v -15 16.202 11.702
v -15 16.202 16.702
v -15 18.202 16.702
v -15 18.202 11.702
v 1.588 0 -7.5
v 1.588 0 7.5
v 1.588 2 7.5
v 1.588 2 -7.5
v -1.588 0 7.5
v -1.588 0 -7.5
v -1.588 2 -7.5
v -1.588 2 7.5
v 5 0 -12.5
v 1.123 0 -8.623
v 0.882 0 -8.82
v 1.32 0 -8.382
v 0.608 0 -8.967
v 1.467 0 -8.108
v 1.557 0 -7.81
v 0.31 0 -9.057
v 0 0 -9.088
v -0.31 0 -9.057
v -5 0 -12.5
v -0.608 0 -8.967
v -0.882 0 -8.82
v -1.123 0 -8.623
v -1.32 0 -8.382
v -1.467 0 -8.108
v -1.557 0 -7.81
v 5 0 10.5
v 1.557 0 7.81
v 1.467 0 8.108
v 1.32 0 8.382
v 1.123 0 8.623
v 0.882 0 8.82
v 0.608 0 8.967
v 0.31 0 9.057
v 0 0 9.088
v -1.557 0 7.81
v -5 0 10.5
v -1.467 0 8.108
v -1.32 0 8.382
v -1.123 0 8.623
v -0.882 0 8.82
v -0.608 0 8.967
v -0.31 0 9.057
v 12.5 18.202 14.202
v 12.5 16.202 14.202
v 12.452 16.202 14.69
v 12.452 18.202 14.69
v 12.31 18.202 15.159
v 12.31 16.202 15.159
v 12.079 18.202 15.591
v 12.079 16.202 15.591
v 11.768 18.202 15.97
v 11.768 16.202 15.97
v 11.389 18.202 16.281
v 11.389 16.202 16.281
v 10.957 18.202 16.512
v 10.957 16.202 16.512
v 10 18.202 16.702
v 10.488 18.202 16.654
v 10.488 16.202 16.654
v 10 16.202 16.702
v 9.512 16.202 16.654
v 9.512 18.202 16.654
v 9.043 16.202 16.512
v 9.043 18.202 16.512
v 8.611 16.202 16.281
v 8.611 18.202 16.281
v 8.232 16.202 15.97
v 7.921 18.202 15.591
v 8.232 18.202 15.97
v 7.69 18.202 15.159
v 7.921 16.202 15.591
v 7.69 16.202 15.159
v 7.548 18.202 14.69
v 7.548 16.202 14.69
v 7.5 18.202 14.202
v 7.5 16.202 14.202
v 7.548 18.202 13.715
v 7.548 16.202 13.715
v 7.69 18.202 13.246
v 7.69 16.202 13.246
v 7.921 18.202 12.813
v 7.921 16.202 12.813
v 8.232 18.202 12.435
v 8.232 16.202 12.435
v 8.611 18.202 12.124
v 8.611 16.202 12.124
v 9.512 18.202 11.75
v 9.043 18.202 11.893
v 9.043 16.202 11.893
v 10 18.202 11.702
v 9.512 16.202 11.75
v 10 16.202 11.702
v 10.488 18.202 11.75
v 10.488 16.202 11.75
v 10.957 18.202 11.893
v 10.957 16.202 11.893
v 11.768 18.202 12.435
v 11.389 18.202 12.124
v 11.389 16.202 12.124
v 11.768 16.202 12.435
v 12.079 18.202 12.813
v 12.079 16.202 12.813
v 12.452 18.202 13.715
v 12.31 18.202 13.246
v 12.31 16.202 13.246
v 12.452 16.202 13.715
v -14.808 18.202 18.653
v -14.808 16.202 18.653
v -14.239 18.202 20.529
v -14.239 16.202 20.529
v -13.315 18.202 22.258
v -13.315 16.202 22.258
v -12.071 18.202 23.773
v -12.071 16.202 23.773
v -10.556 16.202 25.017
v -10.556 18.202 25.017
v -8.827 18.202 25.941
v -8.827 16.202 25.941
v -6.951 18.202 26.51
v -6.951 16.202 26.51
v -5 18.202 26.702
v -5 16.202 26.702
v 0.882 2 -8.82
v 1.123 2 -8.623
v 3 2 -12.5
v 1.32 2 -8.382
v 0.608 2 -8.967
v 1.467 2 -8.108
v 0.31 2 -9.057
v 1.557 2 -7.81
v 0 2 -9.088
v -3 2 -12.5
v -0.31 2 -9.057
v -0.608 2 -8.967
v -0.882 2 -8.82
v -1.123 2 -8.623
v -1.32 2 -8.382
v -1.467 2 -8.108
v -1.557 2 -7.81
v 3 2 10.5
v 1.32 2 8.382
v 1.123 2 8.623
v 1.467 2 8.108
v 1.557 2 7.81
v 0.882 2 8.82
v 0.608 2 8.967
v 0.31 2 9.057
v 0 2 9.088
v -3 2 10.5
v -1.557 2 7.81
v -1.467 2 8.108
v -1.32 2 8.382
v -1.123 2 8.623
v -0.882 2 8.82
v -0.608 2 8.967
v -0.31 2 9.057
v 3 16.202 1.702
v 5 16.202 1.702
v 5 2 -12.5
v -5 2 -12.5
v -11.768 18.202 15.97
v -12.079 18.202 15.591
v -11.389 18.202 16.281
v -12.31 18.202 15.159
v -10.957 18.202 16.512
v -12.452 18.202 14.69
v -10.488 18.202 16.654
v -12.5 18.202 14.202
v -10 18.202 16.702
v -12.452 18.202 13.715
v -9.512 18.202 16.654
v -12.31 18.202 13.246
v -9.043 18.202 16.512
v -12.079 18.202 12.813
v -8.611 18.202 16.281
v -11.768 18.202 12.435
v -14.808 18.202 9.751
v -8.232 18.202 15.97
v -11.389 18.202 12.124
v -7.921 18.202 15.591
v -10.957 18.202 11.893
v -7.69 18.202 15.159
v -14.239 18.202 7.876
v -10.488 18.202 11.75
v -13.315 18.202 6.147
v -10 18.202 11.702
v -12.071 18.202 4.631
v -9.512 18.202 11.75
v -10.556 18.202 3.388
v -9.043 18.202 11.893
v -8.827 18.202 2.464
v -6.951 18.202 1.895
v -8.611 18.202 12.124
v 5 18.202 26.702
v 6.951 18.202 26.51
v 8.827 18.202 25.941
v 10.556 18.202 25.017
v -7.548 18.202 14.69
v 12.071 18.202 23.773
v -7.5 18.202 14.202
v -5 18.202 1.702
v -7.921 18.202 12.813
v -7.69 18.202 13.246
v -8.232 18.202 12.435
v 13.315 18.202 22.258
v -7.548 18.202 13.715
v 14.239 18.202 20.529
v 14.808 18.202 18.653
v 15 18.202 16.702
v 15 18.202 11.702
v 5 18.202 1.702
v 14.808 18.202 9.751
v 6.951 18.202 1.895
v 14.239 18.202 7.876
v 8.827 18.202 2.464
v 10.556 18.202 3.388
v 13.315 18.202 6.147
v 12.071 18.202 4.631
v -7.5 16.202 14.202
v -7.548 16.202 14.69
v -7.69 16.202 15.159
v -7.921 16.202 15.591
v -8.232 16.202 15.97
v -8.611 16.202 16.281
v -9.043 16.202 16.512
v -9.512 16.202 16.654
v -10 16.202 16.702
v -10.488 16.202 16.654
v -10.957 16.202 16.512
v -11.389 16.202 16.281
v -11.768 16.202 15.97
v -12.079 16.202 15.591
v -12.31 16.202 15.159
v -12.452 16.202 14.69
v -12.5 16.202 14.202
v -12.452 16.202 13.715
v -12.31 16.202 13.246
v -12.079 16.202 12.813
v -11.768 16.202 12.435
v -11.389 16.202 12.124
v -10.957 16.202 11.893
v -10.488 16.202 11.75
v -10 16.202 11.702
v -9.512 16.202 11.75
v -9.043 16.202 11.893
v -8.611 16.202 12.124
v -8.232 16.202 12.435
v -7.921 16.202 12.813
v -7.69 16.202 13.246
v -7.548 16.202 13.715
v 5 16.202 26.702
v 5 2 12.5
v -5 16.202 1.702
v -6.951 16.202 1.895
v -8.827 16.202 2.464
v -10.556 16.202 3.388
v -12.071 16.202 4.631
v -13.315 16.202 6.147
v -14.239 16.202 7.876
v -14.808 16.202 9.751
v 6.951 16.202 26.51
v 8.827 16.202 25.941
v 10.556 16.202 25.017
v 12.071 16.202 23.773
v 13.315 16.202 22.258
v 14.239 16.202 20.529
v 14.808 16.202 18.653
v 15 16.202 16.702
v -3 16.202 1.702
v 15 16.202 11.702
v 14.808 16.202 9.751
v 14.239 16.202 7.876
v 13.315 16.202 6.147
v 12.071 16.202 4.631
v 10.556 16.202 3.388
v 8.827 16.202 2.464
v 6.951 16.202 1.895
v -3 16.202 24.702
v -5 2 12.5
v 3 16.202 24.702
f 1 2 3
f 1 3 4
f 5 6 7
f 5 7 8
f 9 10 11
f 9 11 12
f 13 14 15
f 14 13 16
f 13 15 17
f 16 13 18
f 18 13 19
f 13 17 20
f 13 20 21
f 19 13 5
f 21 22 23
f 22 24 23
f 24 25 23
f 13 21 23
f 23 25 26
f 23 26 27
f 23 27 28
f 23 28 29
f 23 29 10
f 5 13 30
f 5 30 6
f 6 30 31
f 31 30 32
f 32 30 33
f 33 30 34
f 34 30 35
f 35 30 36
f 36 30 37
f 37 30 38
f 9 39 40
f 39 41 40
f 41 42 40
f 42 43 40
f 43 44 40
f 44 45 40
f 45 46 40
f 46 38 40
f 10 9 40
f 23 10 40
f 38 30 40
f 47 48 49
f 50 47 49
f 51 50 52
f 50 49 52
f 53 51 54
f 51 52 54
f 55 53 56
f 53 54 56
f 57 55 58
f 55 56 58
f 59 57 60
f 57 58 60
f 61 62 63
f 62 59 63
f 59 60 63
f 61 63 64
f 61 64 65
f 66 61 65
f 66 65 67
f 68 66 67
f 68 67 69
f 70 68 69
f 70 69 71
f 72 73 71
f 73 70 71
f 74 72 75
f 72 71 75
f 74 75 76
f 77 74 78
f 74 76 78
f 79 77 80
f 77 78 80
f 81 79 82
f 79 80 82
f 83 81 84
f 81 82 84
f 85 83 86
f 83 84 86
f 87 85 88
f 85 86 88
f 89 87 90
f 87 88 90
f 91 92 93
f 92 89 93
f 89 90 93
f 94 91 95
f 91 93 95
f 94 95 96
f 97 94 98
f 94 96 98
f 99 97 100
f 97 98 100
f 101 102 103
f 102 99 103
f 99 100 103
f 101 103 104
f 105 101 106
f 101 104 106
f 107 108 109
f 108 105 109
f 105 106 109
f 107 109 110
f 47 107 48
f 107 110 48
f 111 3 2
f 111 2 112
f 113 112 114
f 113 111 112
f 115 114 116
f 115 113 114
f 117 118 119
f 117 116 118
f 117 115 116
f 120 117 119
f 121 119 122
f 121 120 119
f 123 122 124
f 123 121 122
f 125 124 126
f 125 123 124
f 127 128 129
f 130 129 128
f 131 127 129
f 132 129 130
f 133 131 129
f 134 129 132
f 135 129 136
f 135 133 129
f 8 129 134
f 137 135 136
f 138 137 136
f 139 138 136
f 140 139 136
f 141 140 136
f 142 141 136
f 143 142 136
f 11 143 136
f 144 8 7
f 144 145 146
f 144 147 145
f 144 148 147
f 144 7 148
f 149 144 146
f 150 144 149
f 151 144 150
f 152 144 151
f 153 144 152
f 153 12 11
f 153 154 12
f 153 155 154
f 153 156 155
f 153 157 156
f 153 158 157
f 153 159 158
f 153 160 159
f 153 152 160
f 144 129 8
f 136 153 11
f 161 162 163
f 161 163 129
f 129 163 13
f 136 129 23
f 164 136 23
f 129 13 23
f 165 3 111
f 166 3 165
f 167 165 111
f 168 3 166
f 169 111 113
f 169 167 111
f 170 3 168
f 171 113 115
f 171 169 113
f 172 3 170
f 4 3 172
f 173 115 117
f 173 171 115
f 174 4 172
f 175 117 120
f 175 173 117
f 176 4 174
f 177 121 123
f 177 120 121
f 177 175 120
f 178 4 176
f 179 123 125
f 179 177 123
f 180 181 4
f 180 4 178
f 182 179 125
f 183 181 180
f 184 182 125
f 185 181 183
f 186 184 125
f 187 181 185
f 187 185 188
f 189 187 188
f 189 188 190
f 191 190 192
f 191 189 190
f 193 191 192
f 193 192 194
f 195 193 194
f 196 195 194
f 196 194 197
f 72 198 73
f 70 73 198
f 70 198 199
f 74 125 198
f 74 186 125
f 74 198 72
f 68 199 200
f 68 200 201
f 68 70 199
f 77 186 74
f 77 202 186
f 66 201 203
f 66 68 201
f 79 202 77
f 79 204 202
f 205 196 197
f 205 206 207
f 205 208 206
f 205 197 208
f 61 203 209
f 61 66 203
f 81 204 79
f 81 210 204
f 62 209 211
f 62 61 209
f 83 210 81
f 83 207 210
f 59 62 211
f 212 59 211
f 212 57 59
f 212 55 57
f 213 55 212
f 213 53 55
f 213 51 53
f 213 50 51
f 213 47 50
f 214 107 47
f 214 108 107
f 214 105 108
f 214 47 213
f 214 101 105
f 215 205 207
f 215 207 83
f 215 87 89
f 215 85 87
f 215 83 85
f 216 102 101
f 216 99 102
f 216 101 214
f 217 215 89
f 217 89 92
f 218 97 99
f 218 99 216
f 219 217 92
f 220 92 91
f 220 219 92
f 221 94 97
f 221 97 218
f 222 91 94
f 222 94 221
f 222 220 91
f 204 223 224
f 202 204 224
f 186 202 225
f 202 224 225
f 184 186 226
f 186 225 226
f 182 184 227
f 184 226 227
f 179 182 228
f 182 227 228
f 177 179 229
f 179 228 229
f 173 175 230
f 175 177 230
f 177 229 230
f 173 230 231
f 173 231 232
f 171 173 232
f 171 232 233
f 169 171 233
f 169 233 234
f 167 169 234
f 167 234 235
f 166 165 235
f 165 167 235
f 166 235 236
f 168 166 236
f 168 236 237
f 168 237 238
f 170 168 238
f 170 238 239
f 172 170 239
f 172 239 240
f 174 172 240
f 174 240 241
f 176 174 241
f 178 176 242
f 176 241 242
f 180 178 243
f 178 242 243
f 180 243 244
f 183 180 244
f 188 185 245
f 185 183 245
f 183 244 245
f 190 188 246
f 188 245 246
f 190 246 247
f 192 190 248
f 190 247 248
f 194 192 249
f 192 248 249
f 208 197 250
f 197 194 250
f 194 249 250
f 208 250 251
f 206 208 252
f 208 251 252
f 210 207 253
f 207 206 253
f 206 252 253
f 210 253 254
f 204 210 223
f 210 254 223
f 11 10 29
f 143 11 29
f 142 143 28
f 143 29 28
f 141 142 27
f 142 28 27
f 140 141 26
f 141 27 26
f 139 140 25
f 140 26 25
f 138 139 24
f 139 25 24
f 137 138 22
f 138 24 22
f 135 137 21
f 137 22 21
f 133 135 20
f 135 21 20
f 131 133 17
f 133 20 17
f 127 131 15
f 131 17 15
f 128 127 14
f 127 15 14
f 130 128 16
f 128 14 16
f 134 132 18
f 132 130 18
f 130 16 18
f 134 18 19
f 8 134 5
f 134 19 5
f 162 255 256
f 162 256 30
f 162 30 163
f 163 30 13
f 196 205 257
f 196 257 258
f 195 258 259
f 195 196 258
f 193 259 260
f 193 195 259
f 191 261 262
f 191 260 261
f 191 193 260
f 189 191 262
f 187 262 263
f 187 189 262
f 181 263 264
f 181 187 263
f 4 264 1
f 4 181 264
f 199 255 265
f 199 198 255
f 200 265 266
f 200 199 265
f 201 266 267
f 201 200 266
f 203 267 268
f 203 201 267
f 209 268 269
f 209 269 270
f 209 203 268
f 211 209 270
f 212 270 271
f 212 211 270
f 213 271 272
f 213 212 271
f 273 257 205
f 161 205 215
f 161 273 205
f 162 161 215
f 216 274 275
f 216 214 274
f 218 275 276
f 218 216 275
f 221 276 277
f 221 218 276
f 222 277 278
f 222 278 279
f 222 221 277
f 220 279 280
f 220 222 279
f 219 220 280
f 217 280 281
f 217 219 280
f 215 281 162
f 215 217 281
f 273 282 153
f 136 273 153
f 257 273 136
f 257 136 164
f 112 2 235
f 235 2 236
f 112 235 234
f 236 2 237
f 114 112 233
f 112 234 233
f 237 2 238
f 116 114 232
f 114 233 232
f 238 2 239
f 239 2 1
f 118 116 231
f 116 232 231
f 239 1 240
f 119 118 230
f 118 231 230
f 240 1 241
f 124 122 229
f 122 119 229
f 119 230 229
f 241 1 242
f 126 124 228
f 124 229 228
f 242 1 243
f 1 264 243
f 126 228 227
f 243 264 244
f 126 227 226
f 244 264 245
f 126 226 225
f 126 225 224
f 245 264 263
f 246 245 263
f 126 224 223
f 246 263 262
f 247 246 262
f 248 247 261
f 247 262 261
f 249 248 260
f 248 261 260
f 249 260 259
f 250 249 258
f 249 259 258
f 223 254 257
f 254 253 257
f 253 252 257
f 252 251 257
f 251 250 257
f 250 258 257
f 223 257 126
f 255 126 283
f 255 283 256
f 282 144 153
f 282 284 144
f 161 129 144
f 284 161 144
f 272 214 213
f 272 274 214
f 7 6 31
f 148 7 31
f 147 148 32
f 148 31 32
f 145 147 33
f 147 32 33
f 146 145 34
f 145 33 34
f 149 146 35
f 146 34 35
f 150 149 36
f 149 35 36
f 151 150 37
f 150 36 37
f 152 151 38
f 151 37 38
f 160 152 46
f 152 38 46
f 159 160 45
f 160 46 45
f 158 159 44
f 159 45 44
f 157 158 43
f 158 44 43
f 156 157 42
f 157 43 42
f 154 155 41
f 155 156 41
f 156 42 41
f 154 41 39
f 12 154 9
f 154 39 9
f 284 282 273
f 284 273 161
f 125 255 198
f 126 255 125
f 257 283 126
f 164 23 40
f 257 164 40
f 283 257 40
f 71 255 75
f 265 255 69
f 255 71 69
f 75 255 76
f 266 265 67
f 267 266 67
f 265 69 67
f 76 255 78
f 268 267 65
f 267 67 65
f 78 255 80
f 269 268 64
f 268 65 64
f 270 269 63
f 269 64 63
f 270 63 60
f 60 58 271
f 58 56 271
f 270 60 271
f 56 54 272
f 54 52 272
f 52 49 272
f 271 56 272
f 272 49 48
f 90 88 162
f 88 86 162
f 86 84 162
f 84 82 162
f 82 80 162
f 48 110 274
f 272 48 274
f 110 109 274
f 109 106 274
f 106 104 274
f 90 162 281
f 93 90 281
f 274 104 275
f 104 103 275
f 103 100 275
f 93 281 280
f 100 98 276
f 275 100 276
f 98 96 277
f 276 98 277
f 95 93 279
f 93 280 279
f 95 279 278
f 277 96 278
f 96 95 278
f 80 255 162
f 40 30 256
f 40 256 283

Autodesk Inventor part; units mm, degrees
ref_plane "YZ Plane" through (0, 0, 0) normal (1, 0, 0) x (0, 1, 0)
ref_plane "XZ Plane" through (0, 0, 0) normal (0, 1, 0) x (-1, 0, 0)
ref_plane "XY Plane" through (0, 0, 0) normal (0, 0, 1) x (1, 0, 0)
sketch "Sketch1" plane through (0, 0, 0) normal (0, 1, 0) x (-1, 0, 0)
  line L0 (5, 12.5) -> (-5, 12.5)
  line L1 (-5, 12.5) -> (-5, -12.5)
  line L2 (-5, -12.5) -> (5, -12.5)
  line L3 (5, -12.5) -> (5, 12.5)
  line L4 (5, 12.5) -> (-5, -12.5) construction
  line L5 (-5, 12.5) -> (5, -12.5) construction
  line L6 (0, 7.5) -> (0, -7.5) construction
  line L7 (-1.5875, 7.5) -> (-1.5875, -7.5)
  line L8 (1.5875, -7.5) -> (1.5875, 7.5)
  arc A0 (1.5875, 7.5) -> (-1.5875, 7.5) centre (0, 7.5) ccw
  arc A1 (-1.5875, -7.5) -> (1.5875, -7.5) centre (0, -7.5) ccw
  point P0 (0, 0)
  point P1 (0, 0)
  dimension "d0" = 10
  dimension "d1" = 25
  dimension "d2" = 7.5
  dimension "d3" = 7.5
  dimension "d4" = 3.175
extrude "Extrusion1" add sketch "Sketch1" along normal blind 2
sketch "Sketch2" plane through (0, 2, 0) normal (0, 1, 0) x (1, 0, 0)
  line L0 (5, -12.5) -> (5, 12.5) projected
  line L1 (5, 12.5) -> (-5, 12.5) projected
  line L2 (-5, 12.5) -> (-5, -12.5) projected
  line L3 (-5, -12.5) -> (5, -12.5) projected
  arc A0 (-1.5875, -7.5) -> (1.5875, -7.5) centre (0, -7.5) ccw projected
  line L4 (-1.5875, -7.5) -> (-1.5875, 7.5) projected
  arc A1 (1.5875, 7.5) -> (-1.5875, 7.5) centre (0, 7.5) ccw projected
  line L5 (1.5875, 7.5) -> (1.5875, -7.5) projected
  line L6 (-3, -10.5) -> (-3, 10.5)
  line L7 (3, 10.5) -> (3, -10.5)
  line L8 (3, -10.5) -> (-3, -10.5)
  line L9 (-3, 10.5) -> (-3, 12.5)
  line L10 (3, 10.5) -> (3, 12.5)
  point P0 (0, 0)
  dimension "d7" = 2
sketch "Sketch3" plane through (0, 0, 0) normal (1, 0, 0) x (0, 1, 0)
  line L0 (2, 12.5) -> (16.2024, 26.7024)
  point P0 (0, 0)
  dimension "d15" = 20.0852
sweep "Sweep1" add profiles "Sketch2" path "Sketch3" contours L3 L2 L1 L9 L6 L8 L7 L10 L0
chamfer "Chamfer1" distance 2 angle 45 1 edges at (0, 0, 12.5)
sketch "Sketch5" plane through (-5, 16.2024, 26.7024) normal (0, 1, 0) x (1, 0, 0)
  line L0 (20, 0) -> (-10, 0)
  line L1 (-10, 0) -> (-10, 25)
  line L2 (-10, 25) -> (20, 25)
  line L3 (20, 25) -> (20, 0)
  line L4 (10, 0) -> (10, 25) projected
  circle A0 centre (15, 12.5) radius 2.5
  circle A1 centre (-5, 12.5) radius 2.5
  point P0 (5, 26.7024)
  dimension "d23" = 25
  dimension "d24" = 30
  dimension "d25" = 10
  dimension "d26" = 5
  dimension "d27" = 5
  dimension "d28" = 5
  dimension "d29" = 5
extrude "Extrusion4" add sketch "Sketch5" along normal blind 2
fillet "Fillet1" radius 10 4 edges at (15, 17.2024, 1.7024) (-15, 17.2024, 1.7024) (-15, 17.2024, 26.7024) (15, 17.2024, 26.7024)
properties part number "ancla"
